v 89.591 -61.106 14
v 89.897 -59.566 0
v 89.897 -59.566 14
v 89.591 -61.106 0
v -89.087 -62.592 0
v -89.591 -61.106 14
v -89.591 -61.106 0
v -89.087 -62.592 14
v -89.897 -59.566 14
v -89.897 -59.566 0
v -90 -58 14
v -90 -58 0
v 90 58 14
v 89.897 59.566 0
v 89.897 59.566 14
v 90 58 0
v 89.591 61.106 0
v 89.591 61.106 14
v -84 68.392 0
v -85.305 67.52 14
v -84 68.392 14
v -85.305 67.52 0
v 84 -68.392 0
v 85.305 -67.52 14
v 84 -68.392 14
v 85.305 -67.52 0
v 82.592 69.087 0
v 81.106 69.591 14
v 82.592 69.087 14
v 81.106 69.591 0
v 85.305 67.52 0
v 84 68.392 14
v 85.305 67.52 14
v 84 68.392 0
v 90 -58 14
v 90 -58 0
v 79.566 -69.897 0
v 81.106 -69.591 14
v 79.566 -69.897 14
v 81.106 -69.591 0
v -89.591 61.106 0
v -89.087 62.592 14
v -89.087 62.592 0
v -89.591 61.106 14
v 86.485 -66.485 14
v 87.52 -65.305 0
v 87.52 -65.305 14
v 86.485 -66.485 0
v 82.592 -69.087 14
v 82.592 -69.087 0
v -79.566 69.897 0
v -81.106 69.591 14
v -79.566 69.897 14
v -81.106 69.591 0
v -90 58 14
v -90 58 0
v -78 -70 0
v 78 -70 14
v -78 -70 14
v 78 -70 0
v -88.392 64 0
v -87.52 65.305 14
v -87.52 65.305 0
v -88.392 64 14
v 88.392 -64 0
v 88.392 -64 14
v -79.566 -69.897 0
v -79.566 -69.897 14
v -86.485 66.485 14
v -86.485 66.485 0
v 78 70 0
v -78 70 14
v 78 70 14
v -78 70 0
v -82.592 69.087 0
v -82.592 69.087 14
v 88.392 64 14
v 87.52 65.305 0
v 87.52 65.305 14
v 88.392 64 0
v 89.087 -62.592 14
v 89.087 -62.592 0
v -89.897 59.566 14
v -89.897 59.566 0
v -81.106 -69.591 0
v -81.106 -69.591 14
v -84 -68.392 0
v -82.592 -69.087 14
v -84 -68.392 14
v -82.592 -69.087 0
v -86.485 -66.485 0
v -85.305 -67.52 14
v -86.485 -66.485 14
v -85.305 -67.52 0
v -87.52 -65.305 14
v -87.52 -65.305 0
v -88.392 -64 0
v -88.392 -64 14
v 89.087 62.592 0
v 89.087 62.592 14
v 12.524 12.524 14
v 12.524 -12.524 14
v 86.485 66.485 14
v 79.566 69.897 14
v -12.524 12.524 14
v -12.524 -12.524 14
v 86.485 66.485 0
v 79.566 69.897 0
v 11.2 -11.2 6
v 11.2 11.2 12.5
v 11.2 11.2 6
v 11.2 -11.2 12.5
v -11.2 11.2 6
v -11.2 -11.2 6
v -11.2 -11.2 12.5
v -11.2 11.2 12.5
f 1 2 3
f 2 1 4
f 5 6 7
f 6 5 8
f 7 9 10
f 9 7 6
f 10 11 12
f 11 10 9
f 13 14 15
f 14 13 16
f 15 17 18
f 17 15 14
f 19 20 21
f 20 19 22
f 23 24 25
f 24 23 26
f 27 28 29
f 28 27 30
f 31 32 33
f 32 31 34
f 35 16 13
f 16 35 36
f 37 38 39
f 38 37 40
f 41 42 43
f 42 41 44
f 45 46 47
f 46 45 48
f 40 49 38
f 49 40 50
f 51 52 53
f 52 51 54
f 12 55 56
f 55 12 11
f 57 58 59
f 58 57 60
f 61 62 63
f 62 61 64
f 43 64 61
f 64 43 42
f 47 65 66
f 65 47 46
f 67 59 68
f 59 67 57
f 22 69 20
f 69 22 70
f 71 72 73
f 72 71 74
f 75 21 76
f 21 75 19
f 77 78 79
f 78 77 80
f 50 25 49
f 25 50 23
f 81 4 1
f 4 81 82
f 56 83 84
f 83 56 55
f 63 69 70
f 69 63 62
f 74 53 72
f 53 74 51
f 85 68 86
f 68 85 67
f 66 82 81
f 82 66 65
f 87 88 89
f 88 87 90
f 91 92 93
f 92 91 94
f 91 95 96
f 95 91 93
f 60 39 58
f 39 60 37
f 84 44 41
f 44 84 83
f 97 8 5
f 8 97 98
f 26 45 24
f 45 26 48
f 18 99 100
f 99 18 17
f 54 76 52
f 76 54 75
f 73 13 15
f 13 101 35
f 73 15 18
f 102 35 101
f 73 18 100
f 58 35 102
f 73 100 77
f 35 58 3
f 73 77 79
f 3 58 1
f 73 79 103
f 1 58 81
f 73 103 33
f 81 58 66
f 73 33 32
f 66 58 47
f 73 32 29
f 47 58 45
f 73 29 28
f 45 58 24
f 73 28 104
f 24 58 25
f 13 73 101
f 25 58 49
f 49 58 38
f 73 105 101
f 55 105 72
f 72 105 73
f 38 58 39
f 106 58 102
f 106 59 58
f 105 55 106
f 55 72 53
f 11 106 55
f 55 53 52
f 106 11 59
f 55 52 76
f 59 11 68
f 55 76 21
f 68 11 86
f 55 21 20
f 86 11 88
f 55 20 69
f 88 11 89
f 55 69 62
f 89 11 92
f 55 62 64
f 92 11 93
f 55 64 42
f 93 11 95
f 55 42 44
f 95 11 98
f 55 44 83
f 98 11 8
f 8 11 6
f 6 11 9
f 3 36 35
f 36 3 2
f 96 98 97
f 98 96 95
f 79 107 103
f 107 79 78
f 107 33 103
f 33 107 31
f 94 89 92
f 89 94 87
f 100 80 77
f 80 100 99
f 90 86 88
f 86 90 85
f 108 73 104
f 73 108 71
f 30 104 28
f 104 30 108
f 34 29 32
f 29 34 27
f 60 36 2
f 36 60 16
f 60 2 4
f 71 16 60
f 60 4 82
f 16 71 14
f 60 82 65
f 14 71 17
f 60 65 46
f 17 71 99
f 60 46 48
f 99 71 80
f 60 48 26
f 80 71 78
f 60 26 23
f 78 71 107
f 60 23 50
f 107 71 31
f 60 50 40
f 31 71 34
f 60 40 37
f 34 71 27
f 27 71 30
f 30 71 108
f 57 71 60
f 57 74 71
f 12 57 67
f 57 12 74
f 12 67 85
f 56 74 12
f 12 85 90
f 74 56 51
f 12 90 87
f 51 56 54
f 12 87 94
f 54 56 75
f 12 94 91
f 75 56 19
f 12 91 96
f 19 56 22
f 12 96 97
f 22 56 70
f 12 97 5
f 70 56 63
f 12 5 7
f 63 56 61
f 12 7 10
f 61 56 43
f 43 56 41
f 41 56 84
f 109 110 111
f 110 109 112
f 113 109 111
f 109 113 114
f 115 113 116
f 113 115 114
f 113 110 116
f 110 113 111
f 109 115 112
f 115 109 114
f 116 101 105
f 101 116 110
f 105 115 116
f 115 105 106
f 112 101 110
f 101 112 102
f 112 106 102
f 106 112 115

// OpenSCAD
/* Headphone stand in three parts: base, post, hanger */
/* [Parts] */
part = "base"; // [base,post,hanger,assembly]

cadverify_only = "";
module instance(name, part, unit = 1) {
    echo(cadverify_instance = [name, part, unit]);
    if (cadverify_only == "" || cadverify_only == name) children();
}

// ---------- parameters (mm) ----------
base_L = 180;
base_W = 140;
base_H = 14;
base_corner_r = 12;
base_sock_S = 22.4;
base_sock_H = 8;
base_flare_H = 1.5;

post_bot_tenon_S = 22;
post_bot_tenon_H = 8;
post_bot_cham_H = 4;
post_body_bot_S = 30;
post_body_top_S = 24;
post_body_H = 232;
post_top_tenon_S = 18;
post_top_tenon_H = 8;
// total post height = 8+4+232+8 = 252

hanger_L = 110;
hanger_W = 44;
hanger_H = 20;
hanger_sock_S = 18.4;
hanger_sock_H = 8;
hanger_roof_H = 9.2; // half width, 45 deg pyramid

assembly_top = 270;
post_Z_in_assembly = 6;      // post print z0 sits at 6 in assembly
hanger_Z_in_assembly = 250;  // hanger print z0 sits at 250

// ---------- modules (print orientation, min z = 0) ----------
module base() {
    difference() {
        linear_extrude(height = base_H)
            hull() {
                translate([-base_L/2+base_corner_r, -base_W/2+base_corner_r]) circle(r = base_corner_r, $fn = 48);
                translate([ base_L/2-base_corner_r, -base_W/2+base_corner_r]) circle(r = base_corner_r, $fn = 48);
                translate([-base_L/2+base_corner_r,  base_W/2-base_corner_r]) circle(r = base_corner_r, $fn = 48);
                translate([ base_L/2-base_corner_r,  base_W/2-base_corner_r]) circle(r = base_corner_r, $fn = 48);
            }
        // straight socket 22.4 x 22.4 from z=6 to top
        translate([-base_sock_S/2, -base_sock_S/2, base_H - base_sock_H])
            cube([base_sock_S, base_sock_S, base_sock_H + 0.2]);
        // 45 deg entry flare, 1.5 tall: 22.4 at bottom -> 25.4 at top
        translate([0, 0, base_H - base_flare_H])
            linear_extrude(height = base_flare_H + 0.2, scale = (base_sock_S + 2*base_flare_H)/base_sock_S)
                square([base_sock_S, base_sock_S], center = true);
    }
}

module post() {
    // bottom tenon 22x22x8 on bed
    translate([-post_bot_tenon_S/2, -post_bot_tenon_S/2, 0])
        cube([post_bot_tenon_S, post_bot_tenon_S, post_bot_tenon_H]);
    // 45 deg frustum 22 -> 30, 4 tall
    translate([0, 0, post_bot_tenon_H])
        linear_extrude(height = post_bot_cham_H, scale = post_body_bot_S/post_bot_tenon_S)
            square([post_bot_tenon_S, post_bot_tenon_S], center = true);
    // tapered body 30 -> 24, 232 tall
    translate([0, 0, post_bot_tenon_H + post_bot_cham_H])
        linear_extrude(height = post_body_H, scale = post_body_top_S/post_body_bot_S)
            square([post_body_bot_S, post_body_bot_S], center = true);
    // top tenon 18x18x8
    translate([-post_top_tenon_S/2, -post_top_tenon_S/2, post_bot_tenon_H + post_bot_cham_H + post_body_H])
        cube([post_top_tenon_S, post_top_tenon_S, post_top_tenon_H]);
}

module hanger() {
    difference() {
        hull() {
            translate([-55, -22, 0]) cube([110, 44, 8]);
            translate([-50, -19, 0]) cube([20, 38, 14]);
            translate([-15, -16, 0]) cube([30, 32, 20]);
            translate([30, -19, 0]) cube([20, 38, 14]);
        }
        // straight socket 18.4x18.4, 0-8.1
        translate([-hanger_sock_S/2, -hanger_sock_S/2, -0.1])
            cube([hanger_sock_S, hanger_sock_S, hanger_sock_H + 0.2]);
        // 45 deg pyramid roof, base 18.4 at z=8, apex at z=17.2
        polyhedron(points = [[-9.2,-9.2,8],[9.2,-9.2,8],[9.2,9.2,8],[-9.2,9.2,8],[0,0,17.2]],
            faces = [[0,1,2,3],[0,1,4],[1,2,4],[2,3,4],[3,0,4]]);
    }
}

module assembly() {
    instance("base_1", "base") translate([0, 0, 0]) base();
    instance("post_1", "post") translate([0, 0, post_Z_in_assembly]) post();
    instance("hanger_1", "hanger") translate([0, 0, hanger_Z_in_assembly]) hanger();
}

// ---------- spec ----------
if (part == "base") {
    echo(cadverify_spec = [
        ["bounds", [[-90, -70, 0], [90, 70, 14]]],
        ["bodies", 1],
        ["through_holes", 0],
        ["support_faces", [["base_bottom", "-z", 20000]]],
        ["overhangs_allowed", []],
        ["copies", 1],
        ["details", [
            ["base_plate", "material", [[-90, -70, 0], [90, 70, 6]], 0.9],
            ["socket_void", "void", [[-11.2, -11.2, 6], [11.2, 11.2, 12.5]], 0.9],
            ["mouth_flare", "hole", [0, 0, 20], [0, 0, -1], [[0, 28.2], [1.5, 25.3]]],
            ["floor", "thickness", [0, 0, -5], [0, 0, 1], 6]
        ]]
    ]);
} else if (part == "post") {
    echo(cadverify_spec = [
        ["bounds", [[-15, -15, 0], [15, 15, 252]]],
        ["bodies", 1],
        ["through_holes", 0],
        ["support_faces", [["tenon_bottom", "-z", 400]]],
        ["overhangs_allowed", []],
        ["copies", 1],
        ["details", [
            ["bottom_tenon", "material", [[-11, -11, 0], [11, 11, 8]], 0.9],
            ["body_inner", "material", [[-11, -11, 30], [11, 11, 100]], 0.9],
            ["top_tenon", "material", [[-9, -9, 244], [9, 9, 252]], 0.9],
            ["side_wall", "thickness", [-30, 0, 100], [1, 0, 0], 27]
        ]]
    ]);
} else if (part == "hanger") {
    echo(cadverify_spec = [
        ["bounds", [[-55, -22, 0], [55, 22, 20]]],
        ["bodies", 1],
        ["through_holes", 0],
        ["support_faces", [["hanger_bottom", "-z", 3500]]],
        ["overhangs_allowed", []],
        ["copies", 1],
        ["details", [
            ["base_solid", "material", [[-20, -15, 0], [20, 15, 8]], 0.9],
            ["center_top", "material", [[-15, -15, 12], [15, 15, 18]], 0.9],
            ["contact_patch", "material", [[-20, -15, 8], [20, 15, 12]], 0.9],
            ["socket_void", "void", [[-9.2, -9.2, 0], [9.2, 9.2, 8]], 0.9],
            ["roof_void", "void", [[-9.2, -9.2, 8], [9.2, 9.2, 17.2]], 0.3],
            ["socket_entry", "hole", [0, 0, -5], [0, 0, 1], [[0, 18.4], [8, 18.4]]],
            ["floor", "thickness", [0, 0, 30], [0, 0, -1], 2.5],
            ["edge_thickness", "thickness", [50, 0, 30], [0, 0, -1], 13]
        ]]
    ]);
} else if (part == "assembly") {
    echo(cadverify_spec = [
        ["bounds", [[-90, -70, 0], [90, 70, 270]]],
        ["support_faces", [["desk", "-z", 20000]]],
        ["allowed_interferences", []],
        ["motions", []],
        ["assembly_order", [
            [["base_1"], [0, 0, 0]],
            [["post_1"], [0, 0, -1]],
            [["hanger_1"], [0, 0, -1]]
        ]]
    ]);
}

// ---------- output ----------
if (part == "base") base();
else if (part == "post") post();
else if (part == "hanger") hanger();
else if (part == "assembly") assembly();
